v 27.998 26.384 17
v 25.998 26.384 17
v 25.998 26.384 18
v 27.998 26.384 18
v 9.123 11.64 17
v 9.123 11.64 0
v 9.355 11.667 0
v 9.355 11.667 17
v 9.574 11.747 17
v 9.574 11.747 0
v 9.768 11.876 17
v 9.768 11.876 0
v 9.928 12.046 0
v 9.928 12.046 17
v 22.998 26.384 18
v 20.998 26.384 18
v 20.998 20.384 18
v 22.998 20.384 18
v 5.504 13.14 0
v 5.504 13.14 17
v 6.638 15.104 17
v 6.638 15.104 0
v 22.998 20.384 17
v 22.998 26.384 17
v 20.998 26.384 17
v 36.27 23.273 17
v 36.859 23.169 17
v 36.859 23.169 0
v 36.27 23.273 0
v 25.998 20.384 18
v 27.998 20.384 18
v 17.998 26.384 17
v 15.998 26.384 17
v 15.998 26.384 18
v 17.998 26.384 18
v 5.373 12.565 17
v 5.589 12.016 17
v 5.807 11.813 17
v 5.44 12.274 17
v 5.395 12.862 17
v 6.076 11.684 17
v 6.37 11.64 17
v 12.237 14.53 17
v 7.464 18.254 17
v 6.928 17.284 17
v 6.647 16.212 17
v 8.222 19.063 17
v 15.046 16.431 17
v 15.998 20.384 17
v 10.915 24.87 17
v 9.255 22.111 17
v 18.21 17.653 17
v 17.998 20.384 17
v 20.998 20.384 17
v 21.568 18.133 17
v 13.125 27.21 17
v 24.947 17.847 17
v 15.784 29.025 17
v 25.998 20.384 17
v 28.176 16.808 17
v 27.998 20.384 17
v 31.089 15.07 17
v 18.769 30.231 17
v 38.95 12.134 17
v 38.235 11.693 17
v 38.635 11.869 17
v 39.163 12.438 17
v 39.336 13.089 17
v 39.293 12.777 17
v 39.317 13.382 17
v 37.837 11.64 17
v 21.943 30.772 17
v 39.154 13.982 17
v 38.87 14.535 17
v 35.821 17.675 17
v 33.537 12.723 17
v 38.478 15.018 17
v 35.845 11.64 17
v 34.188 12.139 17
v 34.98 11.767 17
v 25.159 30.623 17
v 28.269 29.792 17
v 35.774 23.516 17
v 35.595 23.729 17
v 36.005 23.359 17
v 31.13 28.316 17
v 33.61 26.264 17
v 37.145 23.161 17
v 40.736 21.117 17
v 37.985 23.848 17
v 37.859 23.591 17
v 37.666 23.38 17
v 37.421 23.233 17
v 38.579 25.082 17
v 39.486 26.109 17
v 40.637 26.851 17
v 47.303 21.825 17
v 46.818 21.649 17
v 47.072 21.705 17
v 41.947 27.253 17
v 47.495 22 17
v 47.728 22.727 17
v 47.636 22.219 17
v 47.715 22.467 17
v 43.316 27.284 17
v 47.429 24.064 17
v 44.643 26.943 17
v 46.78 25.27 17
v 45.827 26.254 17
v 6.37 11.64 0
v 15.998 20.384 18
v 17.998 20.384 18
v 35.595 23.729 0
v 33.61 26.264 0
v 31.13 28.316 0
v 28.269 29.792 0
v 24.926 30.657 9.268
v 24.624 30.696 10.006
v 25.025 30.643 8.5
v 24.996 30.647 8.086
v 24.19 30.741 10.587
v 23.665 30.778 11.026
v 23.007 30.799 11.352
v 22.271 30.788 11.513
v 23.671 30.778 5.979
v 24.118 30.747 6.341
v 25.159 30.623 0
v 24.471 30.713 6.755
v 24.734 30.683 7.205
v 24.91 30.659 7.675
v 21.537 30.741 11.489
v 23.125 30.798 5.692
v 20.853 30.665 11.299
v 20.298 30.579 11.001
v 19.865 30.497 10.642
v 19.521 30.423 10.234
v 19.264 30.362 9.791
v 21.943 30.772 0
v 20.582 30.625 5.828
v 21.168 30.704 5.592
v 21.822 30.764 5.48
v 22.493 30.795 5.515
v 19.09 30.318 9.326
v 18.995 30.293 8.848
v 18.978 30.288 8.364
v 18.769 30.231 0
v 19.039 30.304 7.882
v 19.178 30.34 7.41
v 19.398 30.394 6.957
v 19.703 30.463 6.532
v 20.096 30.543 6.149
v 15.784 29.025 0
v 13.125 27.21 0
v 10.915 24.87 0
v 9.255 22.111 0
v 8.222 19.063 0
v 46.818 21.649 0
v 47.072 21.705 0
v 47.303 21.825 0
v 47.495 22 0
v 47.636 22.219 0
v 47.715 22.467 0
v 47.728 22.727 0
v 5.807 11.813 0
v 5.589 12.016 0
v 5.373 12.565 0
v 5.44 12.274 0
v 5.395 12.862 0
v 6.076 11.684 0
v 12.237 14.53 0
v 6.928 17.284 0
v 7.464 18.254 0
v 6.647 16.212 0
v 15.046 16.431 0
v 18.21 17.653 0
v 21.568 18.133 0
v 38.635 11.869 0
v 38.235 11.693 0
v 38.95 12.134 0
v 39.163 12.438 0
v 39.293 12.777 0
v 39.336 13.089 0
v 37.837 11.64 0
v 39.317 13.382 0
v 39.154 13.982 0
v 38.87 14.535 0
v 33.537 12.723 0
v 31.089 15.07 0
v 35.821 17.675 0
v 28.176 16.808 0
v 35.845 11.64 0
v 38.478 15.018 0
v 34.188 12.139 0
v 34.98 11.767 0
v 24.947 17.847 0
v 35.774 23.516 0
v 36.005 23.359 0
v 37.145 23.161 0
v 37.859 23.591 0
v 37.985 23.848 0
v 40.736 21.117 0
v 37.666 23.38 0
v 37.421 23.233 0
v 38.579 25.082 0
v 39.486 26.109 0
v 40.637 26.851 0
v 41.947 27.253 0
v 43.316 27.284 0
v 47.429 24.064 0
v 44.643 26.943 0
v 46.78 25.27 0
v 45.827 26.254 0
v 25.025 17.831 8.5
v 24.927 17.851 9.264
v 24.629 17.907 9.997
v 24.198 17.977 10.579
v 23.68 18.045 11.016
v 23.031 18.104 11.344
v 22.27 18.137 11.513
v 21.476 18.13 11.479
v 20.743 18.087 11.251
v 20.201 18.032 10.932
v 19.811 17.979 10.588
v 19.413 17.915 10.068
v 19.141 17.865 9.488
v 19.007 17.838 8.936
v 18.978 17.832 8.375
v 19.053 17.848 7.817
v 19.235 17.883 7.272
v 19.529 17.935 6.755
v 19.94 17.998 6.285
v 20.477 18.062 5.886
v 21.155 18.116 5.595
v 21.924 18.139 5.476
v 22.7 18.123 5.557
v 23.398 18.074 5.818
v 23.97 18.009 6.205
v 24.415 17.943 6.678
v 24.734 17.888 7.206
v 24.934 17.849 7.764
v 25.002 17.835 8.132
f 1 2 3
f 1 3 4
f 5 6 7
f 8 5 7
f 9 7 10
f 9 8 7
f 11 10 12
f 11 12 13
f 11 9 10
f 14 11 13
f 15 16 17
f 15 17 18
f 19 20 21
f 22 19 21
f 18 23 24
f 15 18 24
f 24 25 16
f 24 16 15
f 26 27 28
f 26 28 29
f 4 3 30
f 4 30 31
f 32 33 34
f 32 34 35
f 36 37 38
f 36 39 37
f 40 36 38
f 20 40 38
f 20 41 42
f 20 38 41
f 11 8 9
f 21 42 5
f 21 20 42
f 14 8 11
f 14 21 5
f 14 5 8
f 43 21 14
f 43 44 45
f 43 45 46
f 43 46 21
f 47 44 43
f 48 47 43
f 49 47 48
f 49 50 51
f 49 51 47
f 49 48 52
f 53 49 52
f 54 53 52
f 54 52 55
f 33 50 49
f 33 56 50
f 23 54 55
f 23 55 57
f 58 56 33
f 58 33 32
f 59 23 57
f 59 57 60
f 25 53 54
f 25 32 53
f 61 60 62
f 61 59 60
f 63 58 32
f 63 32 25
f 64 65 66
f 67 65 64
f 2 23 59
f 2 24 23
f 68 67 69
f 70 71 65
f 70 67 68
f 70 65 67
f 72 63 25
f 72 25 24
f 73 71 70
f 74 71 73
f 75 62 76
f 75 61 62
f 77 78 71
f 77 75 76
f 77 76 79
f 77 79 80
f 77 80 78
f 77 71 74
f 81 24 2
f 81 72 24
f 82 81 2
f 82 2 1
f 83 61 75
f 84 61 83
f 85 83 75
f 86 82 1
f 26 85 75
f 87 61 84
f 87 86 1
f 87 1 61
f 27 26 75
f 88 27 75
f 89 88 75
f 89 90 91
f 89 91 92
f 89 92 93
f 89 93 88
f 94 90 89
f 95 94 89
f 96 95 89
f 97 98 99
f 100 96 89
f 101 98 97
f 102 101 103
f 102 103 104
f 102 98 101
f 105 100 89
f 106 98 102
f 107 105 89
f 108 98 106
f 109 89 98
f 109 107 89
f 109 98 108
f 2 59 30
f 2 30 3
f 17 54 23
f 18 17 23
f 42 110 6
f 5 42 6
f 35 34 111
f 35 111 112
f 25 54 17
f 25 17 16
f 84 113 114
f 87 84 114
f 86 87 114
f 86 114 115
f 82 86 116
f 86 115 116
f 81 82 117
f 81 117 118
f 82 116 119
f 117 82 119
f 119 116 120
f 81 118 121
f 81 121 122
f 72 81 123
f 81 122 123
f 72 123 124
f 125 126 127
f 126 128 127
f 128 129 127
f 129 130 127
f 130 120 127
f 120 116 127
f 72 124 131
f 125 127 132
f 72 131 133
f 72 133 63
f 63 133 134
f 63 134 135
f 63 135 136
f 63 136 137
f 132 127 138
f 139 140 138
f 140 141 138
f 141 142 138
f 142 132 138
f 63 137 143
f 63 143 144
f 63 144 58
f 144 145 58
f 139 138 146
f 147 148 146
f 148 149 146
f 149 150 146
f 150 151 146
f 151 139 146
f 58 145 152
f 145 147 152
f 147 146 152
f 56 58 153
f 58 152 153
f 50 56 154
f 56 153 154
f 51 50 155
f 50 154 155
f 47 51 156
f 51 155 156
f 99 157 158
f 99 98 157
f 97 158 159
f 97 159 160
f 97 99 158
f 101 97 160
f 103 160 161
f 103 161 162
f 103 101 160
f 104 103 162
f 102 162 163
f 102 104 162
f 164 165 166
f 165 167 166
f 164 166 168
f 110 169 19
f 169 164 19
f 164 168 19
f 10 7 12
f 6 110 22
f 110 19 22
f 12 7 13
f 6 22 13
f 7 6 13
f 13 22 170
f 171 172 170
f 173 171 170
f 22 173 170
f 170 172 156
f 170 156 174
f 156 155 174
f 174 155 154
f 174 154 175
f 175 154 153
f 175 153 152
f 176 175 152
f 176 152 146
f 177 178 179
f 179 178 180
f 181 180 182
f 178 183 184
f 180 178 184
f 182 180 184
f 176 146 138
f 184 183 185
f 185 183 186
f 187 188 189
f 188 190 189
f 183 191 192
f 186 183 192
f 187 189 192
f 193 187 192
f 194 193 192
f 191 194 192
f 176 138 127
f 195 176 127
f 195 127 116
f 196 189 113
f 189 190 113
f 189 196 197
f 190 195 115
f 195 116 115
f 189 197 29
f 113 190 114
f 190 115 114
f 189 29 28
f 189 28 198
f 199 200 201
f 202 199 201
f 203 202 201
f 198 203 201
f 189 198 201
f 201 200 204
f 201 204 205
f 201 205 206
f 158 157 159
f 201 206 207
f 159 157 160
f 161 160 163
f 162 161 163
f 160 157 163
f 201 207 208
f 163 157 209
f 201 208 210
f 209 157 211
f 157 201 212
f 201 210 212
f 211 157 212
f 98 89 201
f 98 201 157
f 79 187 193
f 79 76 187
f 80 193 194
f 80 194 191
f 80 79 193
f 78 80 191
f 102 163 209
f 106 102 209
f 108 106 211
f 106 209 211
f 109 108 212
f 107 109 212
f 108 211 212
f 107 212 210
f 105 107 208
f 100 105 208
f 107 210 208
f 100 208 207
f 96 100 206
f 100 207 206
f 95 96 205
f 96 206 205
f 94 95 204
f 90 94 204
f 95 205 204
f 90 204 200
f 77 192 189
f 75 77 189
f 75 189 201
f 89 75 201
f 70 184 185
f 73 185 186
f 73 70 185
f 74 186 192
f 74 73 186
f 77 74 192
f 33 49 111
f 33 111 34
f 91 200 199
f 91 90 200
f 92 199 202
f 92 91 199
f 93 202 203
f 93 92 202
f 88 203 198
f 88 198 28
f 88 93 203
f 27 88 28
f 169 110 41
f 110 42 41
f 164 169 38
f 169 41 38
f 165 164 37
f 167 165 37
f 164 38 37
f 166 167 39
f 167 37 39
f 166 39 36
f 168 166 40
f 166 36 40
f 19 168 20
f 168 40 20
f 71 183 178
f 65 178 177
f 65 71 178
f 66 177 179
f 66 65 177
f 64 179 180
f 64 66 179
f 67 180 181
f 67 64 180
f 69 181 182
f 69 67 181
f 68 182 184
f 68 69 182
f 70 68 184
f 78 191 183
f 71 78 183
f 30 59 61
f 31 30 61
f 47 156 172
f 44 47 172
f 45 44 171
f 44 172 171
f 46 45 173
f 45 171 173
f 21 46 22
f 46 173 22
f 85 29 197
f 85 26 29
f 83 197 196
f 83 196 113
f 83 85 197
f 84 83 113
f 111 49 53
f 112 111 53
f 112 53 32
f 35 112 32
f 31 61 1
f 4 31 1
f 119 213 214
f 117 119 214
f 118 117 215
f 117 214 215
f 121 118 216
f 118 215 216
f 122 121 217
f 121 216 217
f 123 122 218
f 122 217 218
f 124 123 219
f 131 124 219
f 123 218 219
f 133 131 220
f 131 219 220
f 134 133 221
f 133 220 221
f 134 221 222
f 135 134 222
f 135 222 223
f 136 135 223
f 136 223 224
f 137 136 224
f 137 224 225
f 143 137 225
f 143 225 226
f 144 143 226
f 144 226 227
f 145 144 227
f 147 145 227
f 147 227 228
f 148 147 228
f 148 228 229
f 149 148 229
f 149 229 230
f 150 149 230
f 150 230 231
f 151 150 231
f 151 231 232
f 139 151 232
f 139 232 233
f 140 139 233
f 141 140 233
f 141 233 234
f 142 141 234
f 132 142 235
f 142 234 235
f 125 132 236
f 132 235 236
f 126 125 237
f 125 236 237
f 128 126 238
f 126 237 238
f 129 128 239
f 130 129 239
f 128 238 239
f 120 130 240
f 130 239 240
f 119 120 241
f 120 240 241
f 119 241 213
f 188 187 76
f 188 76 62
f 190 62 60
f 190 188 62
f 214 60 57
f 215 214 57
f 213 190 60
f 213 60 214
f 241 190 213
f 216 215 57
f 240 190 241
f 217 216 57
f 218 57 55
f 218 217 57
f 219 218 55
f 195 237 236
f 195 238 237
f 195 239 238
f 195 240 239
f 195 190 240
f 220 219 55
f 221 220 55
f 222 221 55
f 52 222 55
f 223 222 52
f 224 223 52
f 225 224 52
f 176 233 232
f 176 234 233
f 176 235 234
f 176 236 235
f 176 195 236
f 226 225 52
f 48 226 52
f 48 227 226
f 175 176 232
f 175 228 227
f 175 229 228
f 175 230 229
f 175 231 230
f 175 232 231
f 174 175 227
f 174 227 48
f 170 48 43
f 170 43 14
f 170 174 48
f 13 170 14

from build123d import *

# Parameters (mm, degrees)
SKETCH001_W                          = 2
SKETCH001_H                          = 6
EXTRUDE002_DEPTH                     = 1
SKETCH002_AS_DRAWN_R                 = 3.025
EXTRUDE001_DEPTH                     = 100
EXTRUDE001_ONTO_SKETCH002_ROLL_ANGLE = 90
EXTRUDE_DEPTH                        = 17
FILLET_R                             = 1
FILLET001_R                          = 3
FILLET002_R                          = 1.5


with BuildPart() as extrude002:
    # Sketch001 → Extrude002 (new body)
    with BuildSketch(Plane.XY.offset(17)):
        with Locations((16.997575, 23.384003)):
            Rectangle(SKETCH001_W, SKETCH001_H)
        with Locations((21.997575, 23.384003)):
            Rectangle(SKETCH001_W, SKETCH001_H)
        with Locations((26.997575, 23.384003)):
            Rectangle(SKETCH001_W, SKETCH001_H)
    extrude(amount=EXTRUDE002_DEPTH)


with BuildPart() as extrude001:
    # Sketch002 as drawn → Extrude001 (new)
    with BuildSketch(Plane.XY):
        with Locations((22, 8.5)):
            Circle(SKETCH002_AS_DRAWN_R)
    extrude(amount=-EXTRUDE001_DEPTH)


with BuildPart() as extrude001_1:
    # Extrude001 onto Sketch002 roll: moved
    add(extrude001.part.rotate(Axis((0, 0, 0), (1, 0, 0)), EXTRUDE001_ONTO_SKETCH002_ROLL_ANGLE))


with BuildPart() as extrude001_2:
    # Extrude001 onto Sketch002 placement: moved
    add(extrude001_1.part)


with BuildPart() as fusion:
    # Sketch → Extrude (new body)
    with BuildSketch(Plane.XY):
        with BuildLine():
            Line((4.638368, 11.639512), (9.638368, 11.639512))
            ThreePointArc((34.356782, 11.639512), (21.997575, 18.139512), (9.638368, 11.639512))
            Line((34.356782, 11.639512), (39.356782, 11.639512))
            Line((39.356782, 11.639512), (39.356782, 14.139512))
            Line((39.356782, 14.139512), (35.821248, 17.675046))
            Line((35.821248, 17.675046), (40.736161, 21.116505))
            Line((40.736161, 21.116505), (47.709524, 21.726595))
            ThreePointArc((47.709524, 21.726595), (43.383687, 27.276008), (37.792049, 23.004892))
            Line((37.792049, 23.004892), (35.822433, 23.352189))
            ThreePointArc((35.822433, 23.352189), (20.558831, 30.621918), (8.221554, 19.062589))
            ThreePointArc((8.221554, 19.062589), (6.928179, 17.283763), (6.638368, 15.103614))
            Line((4.638368, 11.639512), (6.638368, 15.103614))
        make_face()
    extrude(amount=EXTRUDE_DEPTH)

    # Fillet
    fillet_edges = [fusion.edges().sort_by_distance(p)[0] for p in [
        (4.638368, 11.639512, 8.5),
        (9.638368, 11.639512, 8.5),
        (47.709524, 21.726595, 8.5),
        (37.792049, 23.004892, 8.5),
        (35.822433, 23.352189, 8.5),
    ]]
    fillet(fillet_edges, radius=FILLET_R)

    # Fillet001
    fillet001_edges = [fusion.edges().sort_by_distance(p)[0] for p in [
        (34.356782, 11.639512, 8.5),
        (39.356782, 14.139512, 8.5),
    ]]
    fillet(fillet001_edges, radius=FILLET001_R)

    # Fillet002
    fillet002_edges = [fusion.edges().sort_by_distance(p)[0] for p in [
        (39.356782, 11.639512, 8.5),
    ]]
    fillet(fillet002_edges, radius=FILLET002_R)

    # Cut: cut Extrude001
    add(extrude001_2.part, mode=Mode.SUBTRACT)

    # Fusion: union Extrude002
    add(extrude002.part)


solid = fusion.part
